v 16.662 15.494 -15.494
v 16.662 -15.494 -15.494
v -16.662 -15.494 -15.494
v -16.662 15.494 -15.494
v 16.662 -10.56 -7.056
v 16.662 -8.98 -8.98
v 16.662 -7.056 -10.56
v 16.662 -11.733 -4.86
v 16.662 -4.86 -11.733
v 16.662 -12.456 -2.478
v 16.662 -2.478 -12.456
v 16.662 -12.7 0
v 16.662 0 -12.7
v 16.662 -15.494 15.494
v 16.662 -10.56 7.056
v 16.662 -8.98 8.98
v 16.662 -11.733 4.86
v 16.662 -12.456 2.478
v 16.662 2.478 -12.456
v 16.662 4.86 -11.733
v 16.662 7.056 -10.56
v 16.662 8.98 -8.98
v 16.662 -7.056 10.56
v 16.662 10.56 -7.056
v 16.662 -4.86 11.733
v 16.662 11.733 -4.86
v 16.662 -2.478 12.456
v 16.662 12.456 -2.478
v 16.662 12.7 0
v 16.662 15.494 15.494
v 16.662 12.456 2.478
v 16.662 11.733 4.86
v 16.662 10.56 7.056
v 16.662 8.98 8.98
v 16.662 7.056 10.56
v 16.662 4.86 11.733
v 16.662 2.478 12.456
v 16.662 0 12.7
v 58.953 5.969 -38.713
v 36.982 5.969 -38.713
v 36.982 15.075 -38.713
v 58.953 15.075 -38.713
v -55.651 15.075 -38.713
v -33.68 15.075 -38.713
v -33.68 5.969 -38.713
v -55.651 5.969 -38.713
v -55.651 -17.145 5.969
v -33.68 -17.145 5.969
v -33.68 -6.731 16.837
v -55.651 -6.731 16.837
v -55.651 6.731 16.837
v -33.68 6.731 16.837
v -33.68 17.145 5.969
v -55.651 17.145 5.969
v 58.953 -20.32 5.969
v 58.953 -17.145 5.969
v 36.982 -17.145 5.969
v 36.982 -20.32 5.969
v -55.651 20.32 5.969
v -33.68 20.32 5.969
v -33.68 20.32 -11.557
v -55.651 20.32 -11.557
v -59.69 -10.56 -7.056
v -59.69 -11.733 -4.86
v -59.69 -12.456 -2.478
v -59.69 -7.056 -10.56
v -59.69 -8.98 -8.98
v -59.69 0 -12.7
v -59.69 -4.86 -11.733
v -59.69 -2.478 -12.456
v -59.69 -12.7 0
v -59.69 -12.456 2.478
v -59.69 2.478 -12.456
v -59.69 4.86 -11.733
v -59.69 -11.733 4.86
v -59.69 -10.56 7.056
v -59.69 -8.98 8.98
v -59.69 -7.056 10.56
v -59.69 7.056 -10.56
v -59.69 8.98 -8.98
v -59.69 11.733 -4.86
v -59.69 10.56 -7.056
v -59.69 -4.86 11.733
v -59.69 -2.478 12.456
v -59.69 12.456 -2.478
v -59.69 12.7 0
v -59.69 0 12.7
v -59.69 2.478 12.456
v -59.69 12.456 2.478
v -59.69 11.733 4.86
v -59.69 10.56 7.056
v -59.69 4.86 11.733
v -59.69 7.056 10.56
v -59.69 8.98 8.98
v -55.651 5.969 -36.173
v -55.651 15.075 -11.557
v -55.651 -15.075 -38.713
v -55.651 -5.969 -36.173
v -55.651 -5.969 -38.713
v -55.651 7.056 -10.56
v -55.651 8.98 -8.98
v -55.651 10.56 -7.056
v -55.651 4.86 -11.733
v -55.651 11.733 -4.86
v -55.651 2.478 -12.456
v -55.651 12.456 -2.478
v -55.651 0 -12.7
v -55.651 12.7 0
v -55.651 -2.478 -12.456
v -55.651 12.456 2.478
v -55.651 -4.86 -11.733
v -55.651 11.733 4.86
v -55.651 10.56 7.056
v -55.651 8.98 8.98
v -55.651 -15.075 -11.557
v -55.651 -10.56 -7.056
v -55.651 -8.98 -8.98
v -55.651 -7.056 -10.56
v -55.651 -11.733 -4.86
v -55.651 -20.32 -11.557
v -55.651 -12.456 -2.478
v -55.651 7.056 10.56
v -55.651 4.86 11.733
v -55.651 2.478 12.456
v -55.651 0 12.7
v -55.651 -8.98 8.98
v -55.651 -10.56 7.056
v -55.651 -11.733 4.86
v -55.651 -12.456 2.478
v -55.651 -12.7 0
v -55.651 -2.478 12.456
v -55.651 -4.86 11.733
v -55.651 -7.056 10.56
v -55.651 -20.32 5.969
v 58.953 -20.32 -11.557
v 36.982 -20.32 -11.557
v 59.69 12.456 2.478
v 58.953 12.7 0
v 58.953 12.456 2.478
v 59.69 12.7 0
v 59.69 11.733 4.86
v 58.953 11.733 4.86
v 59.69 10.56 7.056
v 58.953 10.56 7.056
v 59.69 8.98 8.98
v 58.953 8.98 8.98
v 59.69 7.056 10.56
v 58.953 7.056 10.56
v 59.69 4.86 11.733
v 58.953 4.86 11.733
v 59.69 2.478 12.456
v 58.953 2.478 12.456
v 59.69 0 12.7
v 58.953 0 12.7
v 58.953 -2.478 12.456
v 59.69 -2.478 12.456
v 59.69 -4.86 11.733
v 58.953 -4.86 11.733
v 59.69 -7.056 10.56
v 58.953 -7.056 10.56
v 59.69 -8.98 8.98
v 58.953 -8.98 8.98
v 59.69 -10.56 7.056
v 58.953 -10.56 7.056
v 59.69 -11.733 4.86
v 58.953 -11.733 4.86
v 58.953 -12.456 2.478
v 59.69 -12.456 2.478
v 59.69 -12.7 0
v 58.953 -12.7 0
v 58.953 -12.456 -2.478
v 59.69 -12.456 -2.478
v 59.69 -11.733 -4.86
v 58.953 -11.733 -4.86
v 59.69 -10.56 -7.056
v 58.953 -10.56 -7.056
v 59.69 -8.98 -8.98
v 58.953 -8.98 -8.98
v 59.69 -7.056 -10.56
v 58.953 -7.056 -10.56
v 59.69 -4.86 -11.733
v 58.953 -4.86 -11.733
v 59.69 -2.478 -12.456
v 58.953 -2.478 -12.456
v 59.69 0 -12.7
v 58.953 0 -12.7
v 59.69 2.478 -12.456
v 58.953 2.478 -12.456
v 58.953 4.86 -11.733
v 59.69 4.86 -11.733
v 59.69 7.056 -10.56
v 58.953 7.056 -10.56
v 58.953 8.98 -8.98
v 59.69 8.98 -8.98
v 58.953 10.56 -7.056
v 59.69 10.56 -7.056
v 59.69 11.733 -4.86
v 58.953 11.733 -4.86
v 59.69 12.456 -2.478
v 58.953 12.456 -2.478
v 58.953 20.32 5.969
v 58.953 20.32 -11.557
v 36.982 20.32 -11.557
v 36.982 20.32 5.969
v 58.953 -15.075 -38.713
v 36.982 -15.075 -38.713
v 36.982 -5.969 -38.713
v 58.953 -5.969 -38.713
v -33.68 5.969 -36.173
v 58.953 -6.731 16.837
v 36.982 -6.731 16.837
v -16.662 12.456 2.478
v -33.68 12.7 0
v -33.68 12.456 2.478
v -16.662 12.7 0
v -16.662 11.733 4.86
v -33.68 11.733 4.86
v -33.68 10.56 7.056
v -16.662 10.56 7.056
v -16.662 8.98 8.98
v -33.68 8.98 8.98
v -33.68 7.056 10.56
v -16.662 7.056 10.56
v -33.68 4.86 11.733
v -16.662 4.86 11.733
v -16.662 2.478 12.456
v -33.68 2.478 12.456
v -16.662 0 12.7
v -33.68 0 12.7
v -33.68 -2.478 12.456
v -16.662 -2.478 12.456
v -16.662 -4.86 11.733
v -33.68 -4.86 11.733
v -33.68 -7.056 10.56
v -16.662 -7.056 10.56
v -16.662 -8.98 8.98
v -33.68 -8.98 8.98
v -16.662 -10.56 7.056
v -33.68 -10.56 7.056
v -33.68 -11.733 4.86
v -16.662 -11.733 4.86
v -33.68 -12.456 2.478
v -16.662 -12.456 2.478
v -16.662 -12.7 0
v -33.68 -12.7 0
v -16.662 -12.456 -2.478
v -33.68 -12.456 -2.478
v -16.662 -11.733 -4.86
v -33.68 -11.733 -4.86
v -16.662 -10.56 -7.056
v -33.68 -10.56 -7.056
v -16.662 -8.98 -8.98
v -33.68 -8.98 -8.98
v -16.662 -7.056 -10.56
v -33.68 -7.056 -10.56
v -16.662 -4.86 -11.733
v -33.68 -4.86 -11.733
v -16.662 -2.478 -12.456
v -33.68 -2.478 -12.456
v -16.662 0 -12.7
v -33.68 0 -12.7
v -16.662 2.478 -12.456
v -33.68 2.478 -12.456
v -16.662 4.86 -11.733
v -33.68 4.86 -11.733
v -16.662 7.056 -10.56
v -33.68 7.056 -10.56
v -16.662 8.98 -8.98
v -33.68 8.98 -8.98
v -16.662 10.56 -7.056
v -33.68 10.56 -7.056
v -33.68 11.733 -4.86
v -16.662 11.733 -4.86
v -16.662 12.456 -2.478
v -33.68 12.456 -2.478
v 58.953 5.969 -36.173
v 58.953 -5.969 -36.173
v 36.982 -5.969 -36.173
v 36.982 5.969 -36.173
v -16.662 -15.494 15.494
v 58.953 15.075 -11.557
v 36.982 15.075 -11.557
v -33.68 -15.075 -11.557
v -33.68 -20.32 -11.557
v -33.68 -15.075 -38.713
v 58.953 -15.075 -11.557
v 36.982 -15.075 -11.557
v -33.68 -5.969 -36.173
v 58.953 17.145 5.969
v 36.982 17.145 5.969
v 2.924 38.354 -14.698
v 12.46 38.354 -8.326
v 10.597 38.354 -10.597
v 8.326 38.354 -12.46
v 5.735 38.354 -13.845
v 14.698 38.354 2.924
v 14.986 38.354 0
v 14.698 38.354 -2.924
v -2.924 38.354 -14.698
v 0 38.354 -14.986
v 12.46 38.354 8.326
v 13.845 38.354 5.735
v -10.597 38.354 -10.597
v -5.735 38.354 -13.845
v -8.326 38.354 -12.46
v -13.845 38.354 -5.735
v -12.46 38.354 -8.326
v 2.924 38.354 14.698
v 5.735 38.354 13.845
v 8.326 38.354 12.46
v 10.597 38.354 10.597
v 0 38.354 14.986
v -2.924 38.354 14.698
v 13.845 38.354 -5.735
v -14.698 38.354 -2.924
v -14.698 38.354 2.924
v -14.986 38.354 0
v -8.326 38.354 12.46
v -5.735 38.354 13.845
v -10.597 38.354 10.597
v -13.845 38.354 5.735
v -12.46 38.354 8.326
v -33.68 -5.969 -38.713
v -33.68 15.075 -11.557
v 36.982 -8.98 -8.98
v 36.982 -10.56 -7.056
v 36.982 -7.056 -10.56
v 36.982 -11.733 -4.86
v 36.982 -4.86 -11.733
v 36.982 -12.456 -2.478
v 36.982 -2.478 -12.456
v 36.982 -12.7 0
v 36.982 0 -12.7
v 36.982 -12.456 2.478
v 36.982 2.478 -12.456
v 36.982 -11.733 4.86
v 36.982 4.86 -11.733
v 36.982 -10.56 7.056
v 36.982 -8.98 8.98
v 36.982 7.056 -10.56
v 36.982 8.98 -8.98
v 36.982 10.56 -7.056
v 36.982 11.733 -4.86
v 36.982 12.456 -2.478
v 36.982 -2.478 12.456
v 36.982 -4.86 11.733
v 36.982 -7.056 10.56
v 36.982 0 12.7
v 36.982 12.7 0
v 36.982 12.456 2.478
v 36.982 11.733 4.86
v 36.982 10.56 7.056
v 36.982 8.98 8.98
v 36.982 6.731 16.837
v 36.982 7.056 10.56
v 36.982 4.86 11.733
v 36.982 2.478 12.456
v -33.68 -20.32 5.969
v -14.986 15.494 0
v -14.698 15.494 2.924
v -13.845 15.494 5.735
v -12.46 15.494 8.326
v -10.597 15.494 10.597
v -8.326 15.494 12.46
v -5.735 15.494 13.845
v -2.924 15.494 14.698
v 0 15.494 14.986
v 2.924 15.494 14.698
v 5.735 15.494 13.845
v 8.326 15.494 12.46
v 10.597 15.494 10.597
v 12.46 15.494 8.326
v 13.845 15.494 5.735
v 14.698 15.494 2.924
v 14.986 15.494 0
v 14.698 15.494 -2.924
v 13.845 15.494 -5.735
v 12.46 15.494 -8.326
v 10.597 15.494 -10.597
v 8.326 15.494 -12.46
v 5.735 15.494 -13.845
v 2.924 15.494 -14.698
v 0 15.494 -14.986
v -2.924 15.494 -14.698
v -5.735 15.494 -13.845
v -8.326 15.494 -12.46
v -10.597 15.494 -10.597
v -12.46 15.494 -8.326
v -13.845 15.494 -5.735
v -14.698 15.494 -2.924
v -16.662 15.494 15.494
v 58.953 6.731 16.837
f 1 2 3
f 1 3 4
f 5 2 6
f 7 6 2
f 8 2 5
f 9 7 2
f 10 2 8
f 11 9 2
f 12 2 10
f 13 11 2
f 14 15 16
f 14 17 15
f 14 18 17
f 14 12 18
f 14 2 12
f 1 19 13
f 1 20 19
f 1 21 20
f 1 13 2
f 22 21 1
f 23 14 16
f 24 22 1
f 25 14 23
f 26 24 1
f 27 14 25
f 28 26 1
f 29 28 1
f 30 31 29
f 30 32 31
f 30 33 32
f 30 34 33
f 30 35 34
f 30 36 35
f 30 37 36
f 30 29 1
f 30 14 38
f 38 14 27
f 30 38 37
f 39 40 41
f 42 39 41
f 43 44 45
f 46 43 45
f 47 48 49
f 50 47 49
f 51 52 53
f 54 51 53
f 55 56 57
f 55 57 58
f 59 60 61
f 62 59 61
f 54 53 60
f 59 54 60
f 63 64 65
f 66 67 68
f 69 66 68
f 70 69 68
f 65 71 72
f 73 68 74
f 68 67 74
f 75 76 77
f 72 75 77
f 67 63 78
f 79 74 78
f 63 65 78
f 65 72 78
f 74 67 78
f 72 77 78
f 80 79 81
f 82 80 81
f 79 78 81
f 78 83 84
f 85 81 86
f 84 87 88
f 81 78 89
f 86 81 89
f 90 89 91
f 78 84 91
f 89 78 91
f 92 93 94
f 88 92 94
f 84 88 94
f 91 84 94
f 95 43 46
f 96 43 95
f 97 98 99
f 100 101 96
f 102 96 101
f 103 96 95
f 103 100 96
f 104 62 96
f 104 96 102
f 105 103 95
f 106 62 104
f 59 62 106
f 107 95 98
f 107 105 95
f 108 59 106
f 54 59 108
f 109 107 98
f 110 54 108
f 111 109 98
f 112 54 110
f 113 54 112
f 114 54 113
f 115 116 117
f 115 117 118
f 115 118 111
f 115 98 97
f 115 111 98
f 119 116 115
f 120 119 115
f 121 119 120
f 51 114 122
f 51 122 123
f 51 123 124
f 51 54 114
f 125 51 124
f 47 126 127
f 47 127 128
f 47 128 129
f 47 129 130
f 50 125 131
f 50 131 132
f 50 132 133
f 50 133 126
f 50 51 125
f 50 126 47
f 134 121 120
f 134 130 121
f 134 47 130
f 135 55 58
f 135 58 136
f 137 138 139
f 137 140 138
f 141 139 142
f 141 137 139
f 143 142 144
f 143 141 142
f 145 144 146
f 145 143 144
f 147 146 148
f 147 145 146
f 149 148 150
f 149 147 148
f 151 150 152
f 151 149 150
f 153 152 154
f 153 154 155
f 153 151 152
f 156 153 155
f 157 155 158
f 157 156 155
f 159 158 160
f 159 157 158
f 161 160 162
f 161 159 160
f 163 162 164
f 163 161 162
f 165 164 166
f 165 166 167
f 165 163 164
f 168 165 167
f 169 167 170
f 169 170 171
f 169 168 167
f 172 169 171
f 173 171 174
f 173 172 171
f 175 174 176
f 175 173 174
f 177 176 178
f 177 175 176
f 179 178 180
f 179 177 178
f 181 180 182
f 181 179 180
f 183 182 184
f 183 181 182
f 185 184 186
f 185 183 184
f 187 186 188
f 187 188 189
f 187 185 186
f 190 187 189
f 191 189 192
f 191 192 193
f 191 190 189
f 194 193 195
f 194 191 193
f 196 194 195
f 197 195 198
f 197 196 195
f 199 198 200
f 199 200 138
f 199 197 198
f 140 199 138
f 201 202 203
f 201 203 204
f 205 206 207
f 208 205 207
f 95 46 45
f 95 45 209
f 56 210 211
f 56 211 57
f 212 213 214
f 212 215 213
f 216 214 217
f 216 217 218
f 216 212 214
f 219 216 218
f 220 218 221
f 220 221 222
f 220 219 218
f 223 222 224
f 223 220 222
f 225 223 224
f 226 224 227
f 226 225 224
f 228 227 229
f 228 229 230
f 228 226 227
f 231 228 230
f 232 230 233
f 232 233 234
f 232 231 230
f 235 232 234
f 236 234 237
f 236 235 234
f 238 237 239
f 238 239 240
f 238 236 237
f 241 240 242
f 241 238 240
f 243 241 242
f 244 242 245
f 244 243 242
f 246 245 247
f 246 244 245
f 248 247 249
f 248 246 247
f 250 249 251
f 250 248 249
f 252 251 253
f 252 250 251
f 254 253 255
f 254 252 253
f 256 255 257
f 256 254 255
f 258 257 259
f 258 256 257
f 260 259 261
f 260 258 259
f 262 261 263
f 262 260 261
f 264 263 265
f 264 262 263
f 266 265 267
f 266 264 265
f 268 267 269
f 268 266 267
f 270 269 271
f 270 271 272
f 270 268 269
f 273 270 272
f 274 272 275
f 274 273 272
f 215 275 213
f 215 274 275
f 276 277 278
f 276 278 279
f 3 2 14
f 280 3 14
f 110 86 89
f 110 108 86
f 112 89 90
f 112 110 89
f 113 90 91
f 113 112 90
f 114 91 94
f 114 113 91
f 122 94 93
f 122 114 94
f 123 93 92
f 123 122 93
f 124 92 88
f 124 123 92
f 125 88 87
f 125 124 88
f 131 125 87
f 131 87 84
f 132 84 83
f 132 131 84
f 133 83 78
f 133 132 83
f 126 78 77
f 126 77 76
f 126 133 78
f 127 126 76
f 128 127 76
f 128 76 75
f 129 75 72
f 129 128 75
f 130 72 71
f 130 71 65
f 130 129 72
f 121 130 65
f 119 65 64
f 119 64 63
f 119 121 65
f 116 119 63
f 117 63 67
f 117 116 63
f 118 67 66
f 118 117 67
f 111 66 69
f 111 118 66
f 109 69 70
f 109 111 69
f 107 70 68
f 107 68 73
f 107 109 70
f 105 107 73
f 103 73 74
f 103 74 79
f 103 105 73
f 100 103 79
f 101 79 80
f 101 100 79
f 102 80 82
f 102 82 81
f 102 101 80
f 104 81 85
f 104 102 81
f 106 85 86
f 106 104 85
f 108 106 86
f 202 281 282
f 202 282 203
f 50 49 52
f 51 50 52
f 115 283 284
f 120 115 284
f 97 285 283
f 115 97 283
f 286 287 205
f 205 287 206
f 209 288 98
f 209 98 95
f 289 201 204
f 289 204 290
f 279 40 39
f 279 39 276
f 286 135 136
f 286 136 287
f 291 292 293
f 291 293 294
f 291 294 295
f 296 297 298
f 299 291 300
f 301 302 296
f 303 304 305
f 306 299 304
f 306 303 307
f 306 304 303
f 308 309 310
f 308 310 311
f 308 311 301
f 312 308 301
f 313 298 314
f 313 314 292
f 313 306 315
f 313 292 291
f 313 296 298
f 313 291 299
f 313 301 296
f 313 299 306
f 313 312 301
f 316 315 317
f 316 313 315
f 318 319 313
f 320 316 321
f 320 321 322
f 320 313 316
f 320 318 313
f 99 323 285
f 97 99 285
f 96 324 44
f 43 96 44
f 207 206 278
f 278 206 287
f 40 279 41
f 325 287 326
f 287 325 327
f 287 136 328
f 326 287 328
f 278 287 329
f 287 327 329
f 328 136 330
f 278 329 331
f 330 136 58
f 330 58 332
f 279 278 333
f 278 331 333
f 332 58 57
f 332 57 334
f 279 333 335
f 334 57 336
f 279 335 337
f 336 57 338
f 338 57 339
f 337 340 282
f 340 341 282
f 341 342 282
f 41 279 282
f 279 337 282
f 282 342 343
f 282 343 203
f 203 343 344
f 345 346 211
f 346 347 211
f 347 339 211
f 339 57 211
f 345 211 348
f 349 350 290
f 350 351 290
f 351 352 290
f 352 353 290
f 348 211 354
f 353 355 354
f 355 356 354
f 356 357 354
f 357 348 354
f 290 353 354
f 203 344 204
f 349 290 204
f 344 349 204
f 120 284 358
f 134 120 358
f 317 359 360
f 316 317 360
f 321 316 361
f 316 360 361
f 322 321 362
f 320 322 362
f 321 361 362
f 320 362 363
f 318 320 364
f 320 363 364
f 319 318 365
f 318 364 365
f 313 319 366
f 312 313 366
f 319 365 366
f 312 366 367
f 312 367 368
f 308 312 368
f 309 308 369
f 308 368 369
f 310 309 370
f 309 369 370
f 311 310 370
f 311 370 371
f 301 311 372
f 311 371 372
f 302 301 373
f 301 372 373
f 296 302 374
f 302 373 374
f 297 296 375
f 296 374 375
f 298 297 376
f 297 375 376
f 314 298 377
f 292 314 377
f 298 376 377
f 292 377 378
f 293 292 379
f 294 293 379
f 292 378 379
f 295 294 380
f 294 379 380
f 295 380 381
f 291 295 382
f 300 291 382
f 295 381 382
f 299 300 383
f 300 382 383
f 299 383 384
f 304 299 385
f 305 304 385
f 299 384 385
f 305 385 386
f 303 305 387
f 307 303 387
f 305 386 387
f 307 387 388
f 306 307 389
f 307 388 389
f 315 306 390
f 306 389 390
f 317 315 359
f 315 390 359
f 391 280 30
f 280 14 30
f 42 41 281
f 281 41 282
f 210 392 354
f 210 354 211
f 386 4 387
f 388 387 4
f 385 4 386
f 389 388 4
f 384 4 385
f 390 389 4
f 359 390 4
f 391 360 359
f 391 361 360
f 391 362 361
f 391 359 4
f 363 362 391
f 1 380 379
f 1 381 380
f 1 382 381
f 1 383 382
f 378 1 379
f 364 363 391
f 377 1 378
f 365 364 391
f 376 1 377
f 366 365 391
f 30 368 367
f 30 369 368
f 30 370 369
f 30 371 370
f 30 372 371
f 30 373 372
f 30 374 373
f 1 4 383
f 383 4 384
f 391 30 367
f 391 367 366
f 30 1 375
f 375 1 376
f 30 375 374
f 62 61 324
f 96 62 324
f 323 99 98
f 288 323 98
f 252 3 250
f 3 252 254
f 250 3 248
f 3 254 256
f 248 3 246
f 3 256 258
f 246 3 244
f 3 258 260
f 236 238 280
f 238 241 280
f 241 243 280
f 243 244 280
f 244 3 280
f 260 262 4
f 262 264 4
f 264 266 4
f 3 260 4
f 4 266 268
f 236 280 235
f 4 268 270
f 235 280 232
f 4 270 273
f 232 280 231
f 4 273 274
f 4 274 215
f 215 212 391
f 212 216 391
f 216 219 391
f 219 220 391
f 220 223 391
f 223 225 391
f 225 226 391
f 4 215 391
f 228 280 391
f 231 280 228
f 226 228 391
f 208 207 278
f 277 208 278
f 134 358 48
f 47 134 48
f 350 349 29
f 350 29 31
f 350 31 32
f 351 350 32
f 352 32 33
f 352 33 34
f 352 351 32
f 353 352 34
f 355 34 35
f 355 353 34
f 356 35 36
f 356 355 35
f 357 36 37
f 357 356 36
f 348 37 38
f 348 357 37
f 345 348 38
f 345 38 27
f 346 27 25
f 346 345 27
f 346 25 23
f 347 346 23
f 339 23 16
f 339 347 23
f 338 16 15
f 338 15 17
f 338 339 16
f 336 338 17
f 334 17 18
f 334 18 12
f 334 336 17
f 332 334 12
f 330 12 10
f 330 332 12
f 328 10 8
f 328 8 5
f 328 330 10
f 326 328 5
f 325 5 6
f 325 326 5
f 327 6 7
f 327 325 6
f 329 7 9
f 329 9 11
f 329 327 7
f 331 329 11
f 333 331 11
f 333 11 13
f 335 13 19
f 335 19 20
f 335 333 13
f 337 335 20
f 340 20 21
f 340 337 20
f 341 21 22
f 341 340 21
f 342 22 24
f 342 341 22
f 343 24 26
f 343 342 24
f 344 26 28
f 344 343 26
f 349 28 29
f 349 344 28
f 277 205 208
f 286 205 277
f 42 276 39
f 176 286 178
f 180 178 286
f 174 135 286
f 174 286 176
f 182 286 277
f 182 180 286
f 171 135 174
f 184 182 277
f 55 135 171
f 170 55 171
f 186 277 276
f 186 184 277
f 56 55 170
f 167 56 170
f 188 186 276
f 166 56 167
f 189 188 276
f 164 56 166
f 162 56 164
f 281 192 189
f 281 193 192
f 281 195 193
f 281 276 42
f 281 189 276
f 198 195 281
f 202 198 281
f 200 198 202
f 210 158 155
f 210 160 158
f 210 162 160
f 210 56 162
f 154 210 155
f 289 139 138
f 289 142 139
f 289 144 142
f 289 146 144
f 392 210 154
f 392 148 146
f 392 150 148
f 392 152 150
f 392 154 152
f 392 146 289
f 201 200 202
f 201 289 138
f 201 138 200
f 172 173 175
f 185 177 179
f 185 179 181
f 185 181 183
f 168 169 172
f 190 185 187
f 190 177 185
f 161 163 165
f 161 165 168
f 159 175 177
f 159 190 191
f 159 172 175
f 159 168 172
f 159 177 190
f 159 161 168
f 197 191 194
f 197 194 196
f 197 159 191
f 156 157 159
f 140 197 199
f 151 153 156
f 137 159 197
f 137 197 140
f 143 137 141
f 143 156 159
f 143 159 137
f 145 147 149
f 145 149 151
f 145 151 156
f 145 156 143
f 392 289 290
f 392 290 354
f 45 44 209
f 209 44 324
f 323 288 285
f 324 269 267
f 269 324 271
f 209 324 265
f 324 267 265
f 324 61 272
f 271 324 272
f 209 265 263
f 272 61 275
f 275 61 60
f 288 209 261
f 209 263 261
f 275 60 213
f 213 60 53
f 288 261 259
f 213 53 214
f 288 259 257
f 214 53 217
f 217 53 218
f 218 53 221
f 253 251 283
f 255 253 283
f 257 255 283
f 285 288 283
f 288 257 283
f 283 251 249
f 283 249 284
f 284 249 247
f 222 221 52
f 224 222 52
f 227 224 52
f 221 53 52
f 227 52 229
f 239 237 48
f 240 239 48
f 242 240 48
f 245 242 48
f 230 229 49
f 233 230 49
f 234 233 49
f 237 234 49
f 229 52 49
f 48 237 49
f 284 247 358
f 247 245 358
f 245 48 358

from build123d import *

# Parameters (mm, degrees)
F0_R      = 12.7
F1_DEPTH  = 59.69
F2_W      = 30.988
F2_H      = 30.988
F3_DEPTH  = 16.6624
F7_DEPTH  = 21.971
F9_DEPTH  = 21.971
F10_R     = 14.986
F11_DEPTH = 22.86
F12_W     = 11.938
F12_H     = 5.08
F13_DEPTH = 118.6444


with BuildPart() as f1:
    # F0 (on Right) → F1 (new body, symmetric)
    with BuildSketch(Plane.YZ):
        Circle(F0_R)
    extrude(amount=F1_DEPTH, both=True)

    # F2 (on Right) → F3 (join, symmetric)
    with BuildSketch(Plane.YZ):
        Rectangle(F2_W, F2_H)
    extrude(amount=F3_DEPTH, both=True)

    # F6 (on offset) → F7 (join)
    with BuildSketch(Plane.YZ.offset(36.9824)):
        Polygon((-20.32, 5.969), (-20.32, -11.557), (-15.0749, -11.557), (-15.0749, -38.712503105), (0, -38.712503105), (15.0749, -38.712503105), (15.0749, -11.557), (20.32, -11.557), (20.32, 5.969), (17.145, 5.969), (6.731, 16.837296895), (0, 16.837296895), (-6.731, 16.837296895), (-17.145, 5.969), align=None)
    extrude(amount=F7_DEPTH)

    # F8 (on offset) → F9 (join)
    with BuildSketch(Plane(origin=(-33.6804, 0, 0), x_dir=(0, -1, 0), z_dir=(-1, 0, 0))):
        Polygon((-15.0749, -38.712503105), (15.0749, -38.712503105), (15.0749, -11.557), (20.32, -11.557), (20.32, 5.969), (17.145, 5.969), (6.731, 16.837296895), (-6.731, 16.837296895), (-17.145, 5.969), (-20.32, 5.969), (-20.32, -11.557), (-15.0749, -11.557), align=None)
    extrude(amount=F9_DEPTH)

    # F10 (on face) → F11 (join)
    with BuildSketch(Plane(origin=(0, 15.494, 0), x_dir=(-1, 0, 0), z_dir=(0, 1, 0))):
        Circle(F10_R)
    extrude(amount=F11_DEPTH)

    # F12 (on face) → F13 (cut, through all)
    with BuildSketch(Plane.YZ.offset(58.9534)):
        with Locations((0, -38.712503105)):
            Rectangle(F12_W, F12_H)
    extrude(amount=-F13_DEPTH, mode=Mode.SUBTRACT)


solid = f1.part
